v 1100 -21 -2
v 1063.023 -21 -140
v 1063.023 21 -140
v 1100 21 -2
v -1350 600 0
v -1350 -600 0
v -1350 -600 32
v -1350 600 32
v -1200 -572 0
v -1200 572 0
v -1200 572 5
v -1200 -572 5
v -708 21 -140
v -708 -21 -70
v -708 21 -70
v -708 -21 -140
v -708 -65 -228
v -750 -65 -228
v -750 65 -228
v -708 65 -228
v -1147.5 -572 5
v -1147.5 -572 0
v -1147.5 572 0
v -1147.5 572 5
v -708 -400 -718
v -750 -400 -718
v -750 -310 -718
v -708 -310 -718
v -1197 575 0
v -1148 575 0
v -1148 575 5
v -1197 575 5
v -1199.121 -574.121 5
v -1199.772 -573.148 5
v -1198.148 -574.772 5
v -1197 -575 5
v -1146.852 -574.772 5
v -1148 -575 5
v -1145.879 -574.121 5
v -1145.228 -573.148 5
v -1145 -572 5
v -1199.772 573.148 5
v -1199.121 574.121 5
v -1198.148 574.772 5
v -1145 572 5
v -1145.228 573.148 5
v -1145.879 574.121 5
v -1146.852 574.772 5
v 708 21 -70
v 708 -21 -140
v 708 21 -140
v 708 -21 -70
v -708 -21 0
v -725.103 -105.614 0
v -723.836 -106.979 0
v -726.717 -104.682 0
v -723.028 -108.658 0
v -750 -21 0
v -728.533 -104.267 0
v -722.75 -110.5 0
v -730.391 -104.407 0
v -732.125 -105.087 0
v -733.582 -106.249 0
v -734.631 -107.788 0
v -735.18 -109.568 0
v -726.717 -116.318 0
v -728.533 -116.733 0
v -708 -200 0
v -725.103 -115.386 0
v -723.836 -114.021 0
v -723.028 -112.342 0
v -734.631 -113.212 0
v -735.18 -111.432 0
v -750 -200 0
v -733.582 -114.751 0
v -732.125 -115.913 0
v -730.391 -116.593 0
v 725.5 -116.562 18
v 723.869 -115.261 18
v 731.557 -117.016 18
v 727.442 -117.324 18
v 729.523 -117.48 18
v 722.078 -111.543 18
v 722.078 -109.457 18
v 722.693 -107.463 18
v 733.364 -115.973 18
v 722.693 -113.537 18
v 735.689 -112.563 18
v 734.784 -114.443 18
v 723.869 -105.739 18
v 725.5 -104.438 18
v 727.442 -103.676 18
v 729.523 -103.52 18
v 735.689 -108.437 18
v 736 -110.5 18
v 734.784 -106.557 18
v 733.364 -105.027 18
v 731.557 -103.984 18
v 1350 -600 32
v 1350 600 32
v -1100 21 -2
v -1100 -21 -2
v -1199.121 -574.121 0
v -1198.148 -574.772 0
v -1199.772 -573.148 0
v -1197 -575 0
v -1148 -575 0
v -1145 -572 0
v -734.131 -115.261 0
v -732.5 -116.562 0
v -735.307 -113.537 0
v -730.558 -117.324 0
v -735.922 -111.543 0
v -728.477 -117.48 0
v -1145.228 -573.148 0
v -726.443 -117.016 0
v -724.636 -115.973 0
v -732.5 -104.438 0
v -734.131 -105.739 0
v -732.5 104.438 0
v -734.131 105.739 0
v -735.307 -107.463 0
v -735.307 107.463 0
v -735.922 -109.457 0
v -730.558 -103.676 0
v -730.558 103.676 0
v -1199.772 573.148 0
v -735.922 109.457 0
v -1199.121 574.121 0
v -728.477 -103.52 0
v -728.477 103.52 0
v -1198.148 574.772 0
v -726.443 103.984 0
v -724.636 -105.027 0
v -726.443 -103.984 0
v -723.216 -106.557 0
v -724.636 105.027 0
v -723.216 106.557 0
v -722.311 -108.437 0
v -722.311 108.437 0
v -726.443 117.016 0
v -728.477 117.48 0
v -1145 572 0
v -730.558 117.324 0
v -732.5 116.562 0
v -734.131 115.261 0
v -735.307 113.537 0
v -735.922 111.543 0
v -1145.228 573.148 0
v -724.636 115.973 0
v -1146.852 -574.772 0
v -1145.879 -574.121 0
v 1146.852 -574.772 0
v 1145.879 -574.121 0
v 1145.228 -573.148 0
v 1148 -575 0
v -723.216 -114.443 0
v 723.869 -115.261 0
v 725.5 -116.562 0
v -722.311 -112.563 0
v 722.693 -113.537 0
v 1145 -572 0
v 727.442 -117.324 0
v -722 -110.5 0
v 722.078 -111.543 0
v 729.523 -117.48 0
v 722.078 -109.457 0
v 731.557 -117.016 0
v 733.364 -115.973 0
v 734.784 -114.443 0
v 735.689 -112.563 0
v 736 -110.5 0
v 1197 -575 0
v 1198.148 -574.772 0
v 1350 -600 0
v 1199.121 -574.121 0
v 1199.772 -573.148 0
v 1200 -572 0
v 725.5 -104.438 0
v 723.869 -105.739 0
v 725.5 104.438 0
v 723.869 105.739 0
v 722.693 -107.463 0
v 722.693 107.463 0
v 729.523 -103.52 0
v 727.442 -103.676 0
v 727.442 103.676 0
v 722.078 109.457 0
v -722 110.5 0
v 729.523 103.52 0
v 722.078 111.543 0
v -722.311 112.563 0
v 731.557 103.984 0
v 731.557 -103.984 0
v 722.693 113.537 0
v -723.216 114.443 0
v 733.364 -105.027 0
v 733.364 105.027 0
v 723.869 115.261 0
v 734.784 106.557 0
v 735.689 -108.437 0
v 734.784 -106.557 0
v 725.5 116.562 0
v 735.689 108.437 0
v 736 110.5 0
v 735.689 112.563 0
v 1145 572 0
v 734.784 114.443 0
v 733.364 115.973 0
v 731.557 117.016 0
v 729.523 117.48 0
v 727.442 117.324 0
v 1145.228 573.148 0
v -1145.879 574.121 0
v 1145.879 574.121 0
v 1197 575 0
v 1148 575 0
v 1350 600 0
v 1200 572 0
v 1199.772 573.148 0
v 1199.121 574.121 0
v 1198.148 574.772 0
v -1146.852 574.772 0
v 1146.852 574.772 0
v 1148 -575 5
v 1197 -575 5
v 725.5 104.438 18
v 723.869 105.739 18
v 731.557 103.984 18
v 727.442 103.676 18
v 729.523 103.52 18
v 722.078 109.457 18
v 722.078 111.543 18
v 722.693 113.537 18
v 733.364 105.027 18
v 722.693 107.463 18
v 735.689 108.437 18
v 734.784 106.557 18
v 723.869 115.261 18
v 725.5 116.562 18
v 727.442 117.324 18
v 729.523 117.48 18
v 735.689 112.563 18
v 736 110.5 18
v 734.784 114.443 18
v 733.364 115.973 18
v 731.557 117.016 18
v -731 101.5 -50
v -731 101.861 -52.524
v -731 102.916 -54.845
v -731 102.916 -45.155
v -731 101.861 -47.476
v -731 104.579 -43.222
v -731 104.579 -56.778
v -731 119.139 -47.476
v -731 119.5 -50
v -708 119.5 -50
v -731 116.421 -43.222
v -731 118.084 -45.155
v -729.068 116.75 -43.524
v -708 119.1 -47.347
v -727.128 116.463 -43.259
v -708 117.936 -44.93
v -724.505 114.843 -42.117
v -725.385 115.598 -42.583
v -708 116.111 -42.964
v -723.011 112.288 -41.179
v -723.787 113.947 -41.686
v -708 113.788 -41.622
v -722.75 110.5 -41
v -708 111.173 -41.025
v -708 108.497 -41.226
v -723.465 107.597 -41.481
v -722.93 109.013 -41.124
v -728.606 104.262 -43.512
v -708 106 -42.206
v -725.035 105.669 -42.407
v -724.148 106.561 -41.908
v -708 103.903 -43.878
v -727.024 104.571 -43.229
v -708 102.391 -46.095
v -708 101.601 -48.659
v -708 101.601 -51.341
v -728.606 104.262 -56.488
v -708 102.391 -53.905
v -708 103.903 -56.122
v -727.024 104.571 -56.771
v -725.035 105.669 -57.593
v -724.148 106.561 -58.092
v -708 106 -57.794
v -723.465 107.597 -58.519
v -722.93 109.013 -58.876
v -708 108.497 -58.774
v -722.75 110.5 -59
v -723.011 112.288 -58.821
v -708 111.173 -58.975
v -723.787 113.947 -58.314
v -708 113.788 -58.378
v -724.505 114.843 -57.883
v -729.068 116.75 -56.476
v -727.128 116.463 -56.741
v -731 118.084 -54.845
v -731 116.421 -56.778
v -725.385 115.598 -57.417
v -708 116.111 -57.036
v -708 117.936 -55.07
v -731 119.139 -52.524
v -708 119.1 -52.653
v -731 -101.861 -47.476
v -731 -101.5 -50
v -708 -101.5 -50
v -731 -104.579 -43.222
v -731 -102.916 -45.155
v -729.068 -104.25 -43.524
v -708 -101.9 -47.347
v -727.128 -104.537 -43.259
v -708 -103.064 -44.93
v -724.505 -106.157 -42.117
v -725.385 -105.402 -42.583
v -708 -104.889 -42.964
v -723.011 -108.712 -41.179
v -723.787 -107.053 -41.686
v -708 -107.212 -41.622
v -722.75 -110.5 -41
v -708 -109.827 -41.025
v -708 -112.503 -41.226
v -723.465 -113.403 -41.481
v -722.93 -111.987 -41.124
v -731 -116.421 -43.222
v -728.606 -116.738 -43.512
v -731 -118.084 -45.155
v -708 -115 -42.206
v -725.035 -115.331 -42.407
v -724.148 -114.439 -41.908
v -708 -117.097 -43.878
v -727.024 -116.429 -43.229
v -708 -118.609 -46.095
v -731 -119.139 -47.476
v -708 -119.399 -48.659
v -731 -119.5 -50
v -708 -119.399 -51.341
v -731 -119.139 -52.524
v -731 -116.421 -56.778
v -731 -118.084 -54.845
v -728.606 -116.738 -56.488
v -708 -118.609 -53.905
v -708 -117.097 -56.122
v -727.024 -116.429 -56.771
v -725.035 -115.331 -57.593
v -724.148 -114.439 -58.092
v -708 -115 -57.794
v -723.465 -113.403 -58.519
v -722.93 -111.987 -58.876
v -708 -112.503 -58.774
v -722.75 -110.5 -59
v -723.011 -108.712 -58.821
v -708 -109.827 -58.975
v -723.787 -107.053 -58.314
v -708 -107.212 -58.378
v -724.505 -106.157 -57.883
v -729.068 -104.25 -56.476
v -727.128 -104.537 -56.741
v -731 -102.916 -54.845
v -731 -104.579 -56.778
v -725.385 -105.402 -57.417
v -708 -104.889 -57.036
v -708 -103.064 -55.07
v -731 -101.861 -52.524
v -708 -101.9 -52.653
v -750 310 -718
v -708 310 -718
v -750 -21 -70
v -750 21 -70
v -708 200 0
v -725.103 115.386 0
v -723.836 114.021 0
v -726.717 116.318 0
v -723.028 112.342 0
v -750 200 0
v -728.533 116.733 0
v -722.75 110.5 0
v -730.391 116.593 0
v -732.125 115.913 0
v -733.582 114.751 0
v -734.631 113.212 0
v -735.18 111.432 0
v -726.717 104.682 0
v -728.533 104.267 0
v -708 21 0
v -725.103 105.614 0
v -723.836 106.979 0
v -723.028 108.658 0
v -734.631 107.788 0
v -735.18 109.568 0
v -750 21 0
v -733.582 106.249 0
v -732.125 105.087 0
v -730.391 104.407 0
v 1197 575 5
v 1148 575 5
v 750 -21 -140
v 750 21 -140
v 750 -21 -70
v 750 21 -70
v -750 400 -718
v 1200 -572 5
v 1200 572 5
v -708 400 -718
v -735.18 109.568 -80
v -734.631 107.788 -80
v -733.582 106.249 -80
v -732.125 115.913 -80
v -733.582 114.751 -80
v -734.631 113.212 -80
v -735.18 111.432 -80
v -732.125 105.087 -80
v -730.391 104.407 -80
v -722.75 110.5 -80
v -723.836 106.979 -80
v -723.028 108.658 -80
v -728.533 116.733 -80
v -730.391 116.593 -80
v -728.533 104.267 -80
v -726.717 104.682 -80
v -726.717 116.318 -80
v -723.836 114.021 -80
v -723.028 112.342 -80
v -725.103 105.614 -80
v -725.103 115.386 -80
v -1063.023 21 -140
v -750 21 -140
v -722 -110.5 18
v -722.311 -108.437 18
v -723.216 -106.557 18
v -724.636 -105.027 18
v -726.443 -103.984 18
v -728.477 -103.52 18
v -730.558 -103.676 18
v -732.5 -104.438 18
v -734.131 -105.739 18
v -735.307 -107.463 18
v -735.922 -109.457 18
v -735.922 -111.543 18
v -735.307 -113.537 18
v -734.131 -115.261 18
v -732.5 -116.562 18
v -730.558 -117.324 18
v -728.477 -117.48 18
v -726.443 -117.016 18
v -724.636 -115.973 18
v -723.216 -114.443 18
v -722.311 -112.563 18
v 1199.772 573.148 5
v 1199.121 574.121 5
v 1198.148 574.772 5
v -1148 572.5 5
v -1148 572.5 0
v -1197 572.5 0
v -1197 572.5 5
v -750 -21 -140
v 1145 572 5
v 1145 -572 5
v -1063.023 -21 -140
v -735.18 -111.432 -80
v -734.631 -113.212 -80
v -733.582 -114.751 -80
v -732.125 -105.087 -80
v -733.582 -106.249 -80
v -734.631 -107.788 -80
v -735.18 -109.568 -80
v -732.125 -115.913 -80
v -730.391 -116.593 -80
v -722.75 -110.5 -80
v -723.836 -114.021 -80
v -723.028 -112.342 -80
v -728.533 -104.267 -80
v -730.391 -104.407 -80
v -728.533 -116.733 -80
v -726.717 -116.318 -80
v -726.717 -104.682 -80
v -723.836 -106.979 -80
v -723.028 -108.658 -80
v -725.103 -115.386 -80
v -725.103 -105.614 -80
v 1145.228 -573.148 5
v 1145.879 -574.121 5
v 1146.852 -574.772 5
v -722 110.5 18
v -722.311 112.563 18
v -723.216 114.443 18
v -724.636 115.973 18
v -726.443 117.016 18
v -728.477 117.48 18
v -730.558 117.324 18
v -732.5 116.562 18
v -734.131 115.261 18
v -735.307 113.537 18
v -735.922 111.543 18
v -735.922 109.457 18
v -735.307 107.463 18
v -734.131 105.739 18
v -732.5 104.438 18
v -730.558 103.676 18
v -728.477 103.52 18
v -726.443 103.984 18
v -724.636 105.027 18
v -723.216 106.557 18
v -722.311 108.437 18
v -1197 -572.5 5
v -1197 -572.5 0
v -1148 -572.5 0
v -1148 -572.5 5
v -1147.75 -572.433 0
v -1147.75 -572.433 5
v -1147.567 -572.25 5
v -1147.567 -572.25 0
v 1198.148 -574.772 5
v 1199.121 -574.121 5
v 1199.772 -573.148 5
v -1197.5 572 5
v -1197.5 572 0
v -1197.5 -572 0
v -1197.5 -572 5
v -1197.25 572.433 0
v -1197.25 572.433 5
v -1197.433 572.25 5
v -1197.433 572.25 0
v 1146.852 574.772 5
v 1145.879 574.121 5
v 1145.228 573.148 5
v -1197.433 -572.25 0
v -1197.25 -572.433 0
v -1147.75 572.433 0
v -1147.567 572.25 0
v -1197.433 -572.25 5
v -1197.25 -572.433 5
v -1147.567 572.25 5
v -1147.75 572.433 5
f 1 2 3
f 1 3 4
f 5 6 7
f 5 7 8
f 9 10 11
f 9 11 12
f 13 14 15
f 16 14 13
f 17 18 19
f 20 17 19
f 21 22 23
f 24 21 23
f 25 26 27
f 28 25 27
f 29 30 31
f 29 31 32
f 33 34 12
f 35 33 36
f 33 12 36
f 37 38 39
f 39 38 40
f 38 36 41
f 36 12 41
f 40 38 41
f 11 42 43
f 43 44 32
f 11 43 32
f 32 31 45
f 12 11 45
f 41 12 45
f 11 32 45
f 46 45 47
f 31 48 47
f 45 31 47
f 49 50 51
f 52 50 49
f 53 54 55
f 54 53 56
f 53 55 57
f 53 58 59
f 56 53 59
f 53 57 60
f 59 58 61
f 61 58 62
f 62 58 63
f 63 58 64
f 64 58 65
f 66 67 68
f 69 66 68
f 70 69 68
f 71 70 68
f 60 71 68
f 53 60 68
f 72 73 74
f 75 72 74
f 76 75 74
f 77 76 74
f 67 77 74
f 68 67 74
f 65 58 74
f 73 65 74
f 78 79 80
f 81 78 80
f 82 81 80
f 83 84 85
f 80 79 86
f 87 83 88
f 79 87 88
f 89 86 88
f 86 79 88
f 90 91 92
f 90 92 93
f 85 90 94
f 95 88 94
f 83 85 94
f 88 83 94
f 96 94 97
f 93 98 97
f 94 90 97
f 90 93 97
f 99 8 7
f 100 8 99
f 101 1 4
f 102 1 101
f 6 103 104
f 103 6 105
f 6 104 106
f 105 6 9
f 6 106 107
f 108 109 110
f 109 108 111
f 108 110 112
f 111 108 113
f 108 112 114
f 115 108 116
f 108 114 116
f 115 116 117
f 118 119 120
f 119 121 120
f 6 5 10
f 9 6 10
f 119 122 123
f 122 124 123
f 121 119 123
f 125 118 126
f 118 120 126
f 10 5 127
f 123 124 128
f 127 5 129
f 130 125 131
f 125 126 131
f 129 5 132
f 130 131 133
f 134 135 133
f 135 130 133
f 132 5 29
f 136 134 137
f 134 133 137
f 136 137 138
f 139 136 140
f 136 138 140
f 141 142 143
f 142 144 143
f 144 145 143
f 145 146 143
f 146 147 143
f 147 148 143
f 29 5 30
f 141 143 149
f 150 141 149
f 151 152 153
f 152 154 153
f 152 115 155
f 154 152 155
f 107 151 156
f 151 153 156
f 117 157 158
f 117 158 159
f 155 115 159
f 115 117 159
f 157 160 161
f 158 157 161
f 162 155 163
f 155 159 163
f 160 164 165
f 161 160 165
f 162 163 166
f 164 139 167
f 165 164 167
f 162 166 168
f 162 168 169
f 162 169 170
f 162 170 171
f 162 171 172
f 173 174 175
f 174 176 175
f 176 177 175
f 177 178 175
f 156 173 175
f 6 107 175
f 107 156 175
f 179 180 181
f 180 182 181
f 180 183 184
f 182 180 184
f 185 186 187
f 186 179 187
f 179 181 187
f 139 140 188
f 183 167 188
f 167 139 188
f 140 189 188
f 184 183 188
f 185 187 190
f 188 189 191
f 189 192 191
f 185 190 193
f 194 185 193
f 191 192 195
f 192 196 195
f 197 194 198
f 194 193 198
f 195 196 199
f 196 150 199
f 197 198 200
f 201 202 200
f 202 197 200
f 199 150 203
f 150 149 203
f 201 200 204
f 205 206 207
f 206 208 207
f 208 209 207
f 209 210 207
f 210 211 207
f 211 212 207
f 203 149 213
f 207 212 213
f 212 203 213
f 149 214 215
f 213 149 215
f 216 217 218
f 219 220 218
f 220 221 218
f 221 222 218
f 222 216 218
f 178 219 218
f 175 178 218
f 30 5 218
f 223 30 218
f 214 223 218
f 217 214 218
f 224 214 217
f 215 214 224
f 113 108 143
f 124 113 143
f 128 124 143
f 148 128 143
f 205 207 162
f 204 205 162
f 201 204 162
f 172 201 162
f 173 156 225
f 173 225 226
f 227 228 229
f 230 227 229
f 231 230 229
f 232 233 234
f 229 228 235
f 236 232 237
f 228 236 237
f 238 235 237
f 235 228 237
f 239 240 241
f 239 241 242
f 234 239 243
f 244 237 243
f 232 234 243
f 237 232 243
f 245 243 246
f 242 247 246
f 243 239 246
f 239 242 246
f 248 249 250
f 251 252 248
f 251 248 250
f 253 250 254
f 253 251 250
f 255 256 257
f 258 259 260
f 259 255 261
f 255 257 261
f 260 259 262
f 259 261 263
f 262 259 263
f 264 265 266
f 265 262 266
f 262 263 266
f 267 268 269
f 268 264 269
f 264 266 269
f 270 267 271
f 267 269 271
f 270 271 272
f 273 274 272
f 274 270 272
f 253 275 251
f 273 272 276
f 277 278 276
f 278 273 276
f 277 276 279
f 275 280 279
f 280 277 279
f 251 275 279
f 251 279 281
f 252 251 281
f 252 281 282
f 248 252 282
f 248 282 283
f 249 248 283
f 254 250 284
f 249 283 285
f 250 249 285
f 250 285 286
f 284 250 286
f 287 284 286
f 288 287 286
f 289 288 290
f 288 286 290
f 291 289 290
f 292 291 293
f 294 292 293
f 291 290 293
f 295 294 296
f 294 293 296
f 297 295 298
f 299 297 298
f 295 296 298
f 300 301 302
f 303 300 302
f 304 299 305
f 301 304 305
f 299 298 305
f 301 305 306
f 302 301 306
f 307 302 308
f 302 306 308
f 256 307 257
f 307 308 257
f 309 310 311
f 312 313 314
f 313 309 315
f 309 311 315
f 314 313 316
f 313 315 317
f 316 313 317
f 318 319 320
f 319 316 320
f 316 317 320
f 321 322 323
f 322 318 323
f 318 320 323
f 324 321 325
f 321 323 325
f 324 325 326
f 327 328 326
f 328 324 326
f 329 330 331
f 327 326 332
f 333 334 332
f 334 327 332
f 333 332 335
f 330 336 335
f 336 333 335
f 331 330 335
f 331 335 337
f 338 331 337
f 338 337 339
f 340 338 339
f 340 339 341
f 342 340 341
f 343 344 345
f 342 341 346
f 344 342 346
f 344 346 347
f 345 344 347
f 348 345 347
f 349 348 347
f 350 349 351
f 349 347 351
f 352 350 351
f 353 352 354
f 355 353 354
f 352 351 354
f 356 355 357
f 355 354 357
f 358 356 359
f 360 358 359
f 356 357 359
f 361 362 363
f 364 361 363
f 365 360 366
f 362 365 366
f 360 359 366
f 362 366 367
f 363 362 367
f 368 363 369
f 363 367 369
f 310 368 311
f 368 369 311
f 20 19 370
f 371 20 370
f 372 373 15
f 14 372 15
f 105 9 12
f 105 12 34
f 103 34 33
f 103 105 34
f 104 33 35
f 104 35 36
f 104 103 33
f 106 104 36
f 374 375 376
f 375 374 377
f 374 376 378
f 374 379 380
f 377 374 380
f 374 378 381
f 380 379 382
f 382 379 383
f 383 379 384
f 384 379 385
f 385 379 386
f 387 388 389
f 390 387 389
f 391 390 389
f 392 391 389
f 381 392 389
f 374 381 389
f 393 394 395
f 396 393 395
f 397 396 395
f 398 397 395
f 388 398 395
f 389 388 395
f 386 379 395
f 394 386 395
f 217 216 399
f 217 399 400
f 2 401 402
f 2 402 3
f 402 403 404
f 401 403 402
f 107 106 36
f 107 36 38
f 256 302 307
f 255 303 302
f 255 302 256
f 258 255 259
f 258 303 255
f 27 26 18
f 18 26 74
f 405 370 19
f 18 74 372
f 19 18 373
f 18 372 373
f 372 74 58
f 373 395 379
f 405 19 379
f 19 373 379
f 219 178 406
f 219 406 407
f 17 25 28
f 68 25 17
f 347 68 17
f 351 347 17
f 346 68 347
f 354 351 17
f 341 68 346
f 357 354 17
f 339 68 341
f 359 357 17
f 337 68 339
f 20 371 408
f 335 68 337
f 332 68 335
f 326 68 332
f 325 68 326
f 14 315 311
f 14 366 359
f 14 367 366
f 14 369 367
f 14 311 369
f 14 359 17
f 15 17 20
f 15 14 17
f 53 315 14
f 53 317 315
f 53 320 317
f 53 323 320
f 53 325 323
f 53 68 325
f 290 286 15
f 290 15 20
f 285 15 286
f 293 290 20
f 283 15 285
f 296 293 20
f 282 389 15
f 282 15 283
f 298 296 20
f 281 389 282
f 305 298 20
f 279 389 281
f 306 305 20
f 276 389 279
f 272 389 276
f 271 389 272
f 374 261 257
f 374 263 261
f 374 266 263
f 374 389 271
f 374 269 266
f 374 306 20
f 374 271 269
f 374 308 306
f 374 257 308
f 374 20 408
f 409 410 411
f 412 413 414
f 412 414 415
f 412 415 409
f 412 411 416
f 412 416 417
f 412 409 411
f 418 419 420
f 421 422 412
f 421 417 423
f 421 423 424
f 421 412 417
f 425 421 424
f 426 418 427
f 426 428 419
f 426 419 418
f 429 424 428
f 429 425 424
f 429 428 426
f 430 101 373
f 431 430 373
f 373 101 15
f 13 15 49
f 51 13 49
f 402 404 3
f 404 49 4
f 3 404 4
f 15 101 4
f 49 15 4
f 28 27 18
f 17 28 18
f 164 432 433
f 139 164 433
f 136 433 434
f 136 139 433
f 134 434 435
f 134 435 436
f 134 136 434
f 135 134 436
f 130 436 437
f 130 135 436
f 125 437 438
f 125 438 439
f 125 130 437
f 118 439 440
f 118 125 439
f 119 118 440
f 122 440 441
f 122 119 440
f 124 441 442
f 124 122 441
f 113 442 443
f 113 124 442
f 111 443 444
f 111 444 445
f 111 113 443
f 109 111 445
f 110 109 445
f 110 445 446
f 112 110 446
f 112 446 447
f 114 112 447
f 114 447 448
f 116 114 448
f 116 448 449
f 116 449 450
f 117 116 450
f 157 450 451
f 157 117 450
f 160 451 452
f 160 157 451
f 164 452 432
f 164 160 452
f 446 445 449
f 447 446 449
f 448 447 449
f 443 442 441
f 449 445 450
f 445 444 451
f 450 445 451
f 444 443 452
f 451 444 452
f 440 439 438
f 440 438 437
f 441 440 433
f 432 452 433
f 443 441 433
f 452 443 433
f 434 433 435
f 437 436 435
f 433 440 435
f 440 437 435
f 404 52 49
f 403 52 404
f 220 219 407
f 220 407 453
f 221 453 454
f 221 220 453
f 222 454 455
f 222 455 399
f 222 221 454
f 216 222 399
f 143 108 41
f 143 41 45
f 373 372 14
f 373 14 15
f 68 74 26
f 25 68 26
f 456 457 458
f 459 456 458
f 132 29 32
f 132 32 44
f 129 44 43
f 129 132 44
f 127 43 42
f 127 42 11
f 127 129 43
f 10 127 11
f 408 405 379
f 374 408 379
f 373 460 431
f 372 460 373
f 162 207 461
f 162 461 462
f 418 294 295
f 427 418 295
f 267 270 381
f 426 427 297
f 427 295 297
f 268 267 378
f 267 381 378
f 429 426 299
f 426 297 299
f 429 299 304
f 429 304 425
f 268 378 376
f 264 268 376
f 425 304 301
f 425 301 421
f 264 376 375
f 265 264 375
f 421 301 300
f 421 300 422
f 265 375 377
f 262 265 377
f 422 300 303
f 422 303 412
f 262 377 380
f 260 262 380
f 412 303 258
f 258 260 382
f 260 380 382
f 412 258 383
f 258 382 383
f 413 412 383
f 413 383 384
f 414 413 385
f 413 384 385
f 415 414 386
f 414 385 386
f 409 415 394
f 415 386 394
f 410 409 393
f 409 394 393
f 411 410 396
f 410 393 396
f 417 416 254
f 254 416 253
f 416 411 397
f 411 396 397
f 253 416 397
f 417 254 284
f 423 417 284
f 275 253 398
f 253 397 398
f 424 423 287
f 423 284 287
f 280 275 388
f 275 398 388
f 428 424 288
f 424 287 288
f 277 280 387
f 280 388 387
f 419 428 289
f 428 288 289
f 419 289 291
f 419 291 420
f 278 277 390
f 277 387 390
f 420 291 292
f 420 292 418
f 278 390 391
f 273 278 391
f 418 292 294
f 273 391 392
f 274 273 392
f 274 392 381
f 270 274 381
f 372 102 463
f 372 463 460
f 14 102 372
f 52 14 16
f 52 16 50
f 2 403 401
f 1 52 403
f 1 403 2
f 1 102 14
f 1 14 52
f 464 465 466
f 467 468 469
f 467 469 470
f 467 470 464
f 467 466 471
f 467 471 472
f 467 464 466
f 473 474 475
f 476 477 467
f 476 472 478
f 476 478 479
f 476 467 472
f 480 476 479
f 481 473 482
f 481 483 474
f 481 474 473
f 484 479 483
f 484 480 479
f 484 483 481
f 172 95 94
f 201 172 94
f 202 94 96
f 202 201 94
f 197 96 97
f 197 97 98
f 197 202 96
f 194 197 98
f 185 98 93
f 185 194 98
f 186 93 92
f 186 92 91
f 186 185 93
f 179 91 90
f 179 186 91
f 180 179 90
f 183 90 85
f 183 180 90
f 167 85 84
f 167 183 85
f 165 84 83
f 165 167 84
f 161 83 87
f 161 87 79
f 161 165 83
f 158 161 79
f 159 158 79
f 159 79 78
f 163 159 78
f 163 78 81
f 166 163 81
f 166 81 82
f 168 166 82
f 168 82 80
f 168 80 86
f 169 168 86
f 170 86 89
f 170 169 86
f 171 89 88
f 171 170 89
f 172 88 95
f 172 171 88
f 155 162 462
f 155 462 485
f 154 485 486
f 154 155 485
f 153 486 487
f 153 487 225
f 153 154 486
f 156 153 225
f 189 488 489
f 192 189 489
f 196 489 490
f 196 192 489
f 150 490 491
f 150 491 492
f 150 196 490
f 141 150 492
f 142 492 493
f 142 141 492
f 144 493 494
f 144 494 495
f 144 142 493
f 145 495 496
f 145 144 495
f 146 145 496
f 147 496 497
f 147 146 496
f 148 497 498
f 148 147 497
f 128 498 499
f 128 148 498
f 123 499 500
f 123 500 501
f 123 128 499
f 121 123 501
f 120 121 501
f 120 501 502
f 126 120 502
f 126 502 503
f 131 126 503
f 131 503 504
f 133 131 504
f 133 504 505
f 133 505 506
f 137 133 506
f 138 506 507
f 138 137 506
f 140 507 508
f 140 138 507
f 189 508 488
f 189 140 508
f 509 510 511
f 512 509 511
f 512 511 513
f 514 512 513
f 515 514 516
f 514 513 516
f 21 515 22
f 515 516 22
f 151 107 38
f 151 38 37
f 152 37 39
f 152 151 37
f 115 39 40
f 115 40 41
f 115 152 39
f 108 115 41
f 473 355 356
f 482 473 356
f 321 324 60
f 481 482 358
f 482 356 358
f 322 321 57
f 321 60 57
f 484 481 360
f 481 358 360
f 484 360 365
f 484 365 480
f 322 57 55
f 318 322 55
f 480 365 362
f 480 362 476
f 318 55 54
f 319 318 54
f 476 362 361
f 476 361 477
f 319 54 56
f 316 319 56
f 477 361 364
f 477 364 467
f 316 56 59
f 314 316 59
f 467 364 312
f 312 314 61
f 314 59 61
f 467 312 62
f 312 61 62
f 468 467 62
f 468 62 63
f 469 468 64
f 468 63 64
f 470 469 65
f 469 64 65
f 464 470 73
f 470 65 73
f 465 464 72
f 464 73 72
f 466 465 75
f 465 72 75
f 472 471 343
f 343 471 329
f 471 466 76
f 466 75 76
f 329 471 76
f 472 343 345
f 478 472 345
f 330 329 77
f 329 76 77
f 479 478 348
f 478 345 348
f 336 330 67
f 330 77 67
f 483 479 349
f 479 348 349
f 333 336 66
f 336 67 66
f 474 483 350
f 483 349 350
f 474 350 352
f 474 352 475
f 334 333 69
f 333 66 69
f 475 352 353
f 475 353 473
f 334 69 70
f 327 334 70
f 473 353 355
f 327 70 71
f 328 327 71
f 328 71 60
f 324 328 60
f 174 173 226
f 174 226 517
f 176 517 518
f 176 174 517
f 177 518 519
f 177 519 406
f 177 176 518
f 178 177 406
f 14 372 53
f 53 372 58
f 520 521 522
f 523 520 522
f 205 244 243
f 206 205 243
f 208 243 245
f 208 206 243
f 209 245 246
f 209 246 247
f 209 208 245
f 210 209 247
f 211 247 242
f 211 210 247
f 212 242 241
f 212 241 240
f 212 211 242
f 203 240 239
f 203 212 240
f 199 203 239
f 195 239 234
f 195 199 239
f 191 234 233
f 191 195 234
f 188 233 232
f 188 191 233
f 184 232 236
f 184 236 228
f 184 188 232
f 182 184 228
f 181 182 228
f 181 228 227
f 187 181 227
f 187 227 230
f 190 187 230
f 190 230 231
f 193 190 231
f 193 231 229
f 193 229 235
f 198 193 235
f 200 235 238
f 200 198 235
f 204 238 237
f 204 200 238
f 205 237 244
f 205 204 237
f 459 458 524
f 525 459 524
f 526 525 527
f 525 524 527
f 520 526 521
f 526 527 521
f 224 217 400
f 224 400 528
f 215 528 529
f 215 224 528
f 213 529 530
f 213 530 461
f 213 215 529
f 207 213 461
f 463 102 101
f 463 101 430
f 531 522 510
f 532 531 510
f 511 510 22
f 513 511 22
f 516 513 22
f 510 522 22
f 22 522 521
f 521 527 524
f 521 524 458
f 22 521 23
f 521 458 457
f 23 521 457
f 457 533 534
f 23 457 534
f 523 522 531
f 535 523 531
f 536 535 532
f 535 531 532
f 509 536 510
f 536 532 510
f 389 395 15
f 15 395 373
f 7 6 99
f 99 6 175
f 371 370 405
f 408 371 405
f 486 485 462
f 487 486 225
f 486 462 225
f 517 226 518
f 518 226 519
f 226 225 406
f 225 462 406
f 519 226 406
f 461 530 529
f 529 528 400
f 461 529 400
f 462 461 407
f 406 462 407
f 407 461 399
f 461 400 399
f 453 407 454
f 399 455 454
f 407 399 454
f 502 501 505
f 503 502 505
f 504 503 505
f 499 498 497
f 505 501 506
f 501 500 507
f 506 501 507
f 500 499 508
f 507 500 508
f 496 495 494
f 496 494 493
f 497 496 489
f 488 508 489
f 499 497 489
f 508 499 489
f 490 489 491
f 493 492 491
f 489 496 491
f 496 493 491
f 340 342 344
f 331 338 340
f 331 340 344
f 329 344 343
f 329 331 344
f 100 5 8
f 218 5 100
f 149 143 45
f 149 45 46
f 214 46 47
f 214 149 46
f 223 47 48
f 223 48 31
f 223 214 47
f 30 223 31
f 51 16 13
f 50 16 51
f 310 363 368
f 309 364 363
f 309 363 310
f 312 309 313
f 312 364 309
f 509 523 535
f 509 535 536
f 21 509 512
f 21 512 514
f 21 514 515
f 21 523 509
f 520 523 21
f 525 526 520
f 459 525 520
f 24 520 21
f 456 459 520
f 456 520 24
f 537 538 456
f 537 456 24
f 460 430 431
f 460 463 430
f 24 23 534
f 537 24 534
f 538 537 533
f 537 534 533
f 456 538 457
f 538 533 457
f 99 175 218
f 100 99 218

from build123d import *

# Parameters (mm, degrees)
F0_W      = 2700
F0_H      = 1200
F1_DEPTH  = 32
F2_DEPTH  = 5
F3_DEPTH  = 5
F5_W      = 42
F5_H      = 70
F6_DEPTH  = 42
F7_R      = 7
F7_R_2    = 6.25
F8_DEPTH  = 18
F9_DEPTH  = 80
F10_R     = 9
F11_DEPTH = 23
F13_DEPTH = 21


with BuildPart() as f1:
    # F0 (on Top) → F1 (new body)
    with BuildSketch(Plane.XY):
        Rectangle(F0_W, F0_H)
        with BuildLine():
            Line((-1197, 575), (-1148, 575))
            ThreePointArc((-1148, 575), (-1145.8786796564, 574.1213203436), (-1145, 572))
            Line((-1145, 572), (-1145, -572))
            ThreePointArc((-1145, -572), (-1145.8786796564, -574.1213203436), (-1148, -575))
            Line((-1148, -575), (-1197, -575))
            ThreePointArc((-1197, -575), (-1199.1213203436, -574.1213203436), (-1200, -572))
            Line((-1200, -572), (-1200, 572))
            ThreePointArc((-1200, 572), (-1199.1213203436, 574.1213203436), (-1197, 575))
        make_face(mode=Mode.SUBTRACT)
        with BuildLine():
            Line((1197, -575), (1148, -575))
            ThreePointArc((1148, -575), (1145.8786796564, -574.1213203436), (1145, -572))
            Line((1145, -572), (1145, 572))
            ThreePointArc((1145, 572), (1145.8786796564, 574.1213203436), (1148, 575))
            Line((1148, 575), (1197, 575))
            ThreePointArc((1197, 575), (1199.1213203436, 574.1213203436), (1200, 572))
            Line((1200, 572), (1200, -572))
            ThreePointArc((1200, -572), (1199.1213203436, -574.1213203436), (1197, -575))
        make_face(mode=Mode.SUBTRACT)
        with BuildLine():
            ThreePointArc((-1145, 572), (-1145.8786796564, 574.1213203436), (-1148, 575))
            Line((-1148, 575), (-1197, 575))
            ThreePointArc((-1197, 575), (-1199.1213203436, 574.1213203436), (-1200, 572))
            Line((-1200, 572), (-1200, -572))
            ThreePointArc((-1200, -572), (-1199.1213203436, -574.1213203436), (-1197, -575))
            Line((-1197, -575), (-1148, -575))
            ThreePointArc((-1148, -575), (-1145.8786796564, -574.1213203436), (-1145, -572))
            Line((-1145, -572), (-1145, 572))
        make_face()
        with BuildLine():
            ThreePointArc((-1148, 572.5), (-1147.6464466094, 572.3535533906), (-1147.5, 572))
            Line((-1147.5, 572), (-1147.5, -572))
            ThreePointArc((-1147.5, -572), (-1147.6464466094, -572.3535533906), (-1148, -572.5))
            Line((-1148, -572.5), (-1197, -572.5))
            ThreePointArc((-1197, -572.5), (-1197.3535533906, -572.3535533906), (-1197.5, -572))
            Line((-1197.5, -572), (-1197.5, 572))
            ThreePointArc((-1197.5, 572), (-1197.3535533906, 572.3535533906), (-1197, 572.5))
            Line((-1197, 572.5), (-1148, 572.5))
        make_face(mode=Mode.SUBTRACT)
        with BuildLine():
            ThreePointArc((1145, -572), (1145.8786796564, -574.1213203436), (1148, -575))
            Line((1148, -575), (1197, -575))
            ThreePointArc((1197, -575), (1199.1213203436, -574.1213203436), (1200, -572))
            Line((1200, -572), (1200, 572))
            ThreePointArc((1200, 572), (1199.1213203436, 574.1213203436), (1197, 575))
            Line((1197, 575), (1148, 575))
            ThreePointArc((1148, 575), (1145.8786796564, 574.1213203436), (1145, 572))
            Line((1145, 572), (1145, -572))
        make_face()
        with BuildLine():
            Line((-1147.5, -572), (-1147.5, 572))
            ThreePointArc((-1147.5, 572), (-1147.6464466094, 572.3535533906), (-1148, 572.5))
            Line((-1148, 572.5), (-1197, 572.5))
            ThreePointArc((-1197, 572.5), (-1197.3535533906, 572.3535533906), (-1197.5, 572))
            Line((-1197.5, 572), (-1197.5, -572))
            ThreePointArc((-1197.5, -572), (-1197.3535533906, -572.3535533906), (-1197, -572.5))
            Line((-1197, -572.5), (-1148, -572.5))
            ThreePointArc((-1148, -572.5), (-1147.6464466094, -572.3535533906), (-1147.5, -572))
        make_face()
    extrude(amount=F1_DEPTH)

    # F0 (on Top) → F2 (cut)
    with BuildSketch(Plane.XY):
        with BuildLine():
            ThreePointArc((-1145, 572), (-1145.8786796564, 574.1213203436), (-1148, 575))
            Line((-1148, 575), (-1197, 575))
            ThreePointArc((-1197, 575), (-1199.1213203436, 574.1213203436), (-1200, 572))
            Line((-1200, 572), (-1200, -572))
            ThreePointArc((-1200, -572), (-1199.1213203436, -574.1213203436), (-1197, -575))
            Line((-1197, -575), (-1148, -575))
            ThreePointArc((-1148, -575), (-1145.8786796564, -574.1213203436), (-1145, -572))
            Line((-1145, -572), (-1145, 572))
        make_face()
        with BuildLine():
            ThreePointArc((-1148, 572.5), (-1147.6464466094, 572.3535533906), (-1147.5, 572))
            Line((-1147.5, 572), (-1147.5, -572))
            ThreePointArc((-1147.5, -572), (-1147.6464466094, -572.3535533906), (-1148, -572.5))
            Line((-1148, -572.5), (-1197, -572.5))
            ThreePointArc((-1197, -572.5), (-1197.3535533906, -572.3535533906), (-1197.5, -572))
            Line((-1197.5, -572), (-1197.5, 572))
            ThreePointArc((-1197.5, 572), (-1197.3535533906, 572.3535533906), (-1197, 572.5))
            Line((-1197, 572.5), (-1148, 572.5))
        make_face(mode=Mode.SUBTRACT)
        with BuildLine():
            ThreePointArc((1145, -572), (1145.8786796564, -574.1213203436), (1148, -575))
            Line((1148, -575), (1197, -575))
            ThreePointArc((1197, -575), (1199.1213203436, -574.1213203436), (1200, -572))
            Line((1200, -572), (1200, 572))
            ThreePointArc((1200, 572), (1199.1213203436, 574.1213203436), (1197, 575))
            Line((1197, 575), (1148, 575))
            ThreePointArc((1148, 575), (1145.8786796564, 574.1213203436), (1145, 572))
            Line((1145, 572), (1145, -572))
        make_face()
        with BuildLine():
            Line((-1147.5, -572), (-1147.5, 572))
            ThreePointArc((-1147.5, 572), (-1147.6464466094, 572.3535533906), (-1148, 572.5))
            Line((-1148, 572.5), (-1197, 572.5))
            ThreePointArc((-1197, 572.5), (-1197.3535533906, 572.3535533906), (-1197.5, 572))
            Line((-1197.5, 572), (-1197.5, -572))
            ThreePointArc((-1197.5, -572), (-1197.3535533906, -572.3535533906), (-1197, -572.5))
            Line((-1197, -572.5), (-1148, -572.5))
            ThreePointArc((-1148, -572.5), (-1147.6464466094, -572.3535533906), (-1147.5, -572))
        make_face()
    extrude(amount=F2_DEPTH, mode=Mode.SUBTRACT)

    # F7 (on face) → F8 (cut)
    with BuildSketch(Plane.XY):
        with Locations((-729, 110.5)):
            Circle(F7_R)
        with Locations((-729, 110.5)):
            Circle(F7_R_2, mode=Mode.SUBTRACT)
        with Locations((-729, 110.5)):
            Circle(F7_R_2)
        with Locations((-729, -110.5)):
            Circle(F7_R)
        with Locations((-729, -110.5)):
            Circle(F7_R_2, mode=Mode.SUBTRACT)
        with Locations((-729, -110.5)):
            Circle(F7_R_2)
        with Locations((729, -110.5)):
            Circle(F7_R)
        with Locations((729, 110.5)):
            Circle(F7_R)
    extrude(amount=F8_DEPTH, mode=Mode.SUBTRACT)


with BuildPart() as f3:
    # F0 (on Top) → F3 (new body)
    with BuildSketch(Plane.XY):
        with BuildLine():
            Line((-1147.5, -572), (-1147.5, 572))
            ThreePointArc((-1147.5, 572), (-1147.6464466094, 572.3535533906), (-1148, 572.5))
            Line((-1148, 572.5), (-1197, 572.5))
            ThreePointArc((-1197, 572.5), (-1197.3535533906, 572.3535533906), (-1197.5, 572))
            Line((-1197.5, 572), (-1197.5, -572))
            ThreePointArc((-1197.5, -572), (-1197.3535533906, -572.3535533906), (-1197, -572.5))
            Line((-1197, -572.5), (-1148, -572.5))
            ThreePointArc((-1148, -572.5), (-1147.6464466094, -572.3535533906), (-1147.5, -572))
        make_face()
    extrude(amount=F3_DEPTH)


with BuildPart() as f6:
    # F5 (on offset) → F6 (new body)
    with BuildSketch(Plane.YZ.offset(-750)):
        Polygon((-21, -70), (-21, 0), (-200, 0), (-400, -718), (-310, -718), (-65, -228), (0, -228), (65, -228), (310, -718), (400, -718), (200, 0), (21, 0), (21, -70), (21, -140), (-21, -140), align=None)
        with Locations((0, -105)):
            Rectangle(F5_W, F5_H)
    extrude(amount=F6_DEPTH)

    # F7 (on face) → F9 (cut)
    with BuildSketch(Plane.XY):
        with Locations((-729, 110.5)):
            Circle(F7_R_2)
        with Locations((-729, -110.5)):
            Circle(F7_R_2)
    extrude(amount=-F9_DEPTH, mode=Mode.SUBTRACT)

    # F10 (on face) → F11 (cut)
    with BuildSketch(Plane.YZ.offset(-708)):
        with Locations((110.5, -50)):
            Circle(F10_R)
        with Locations((-110.5, -50)):
            Circle(F10_R)
    extrude(amount=-F11_DEPTH, mode=Mode.SUBTRACT)


with BuildPart() as f13:
    # F12 (on Front) → F13 (new body, symmetric)
    with BuildSketch(Plane.XZ):
        Polygon((-750, -70), (-708, -70), (-708, -140), (0, -140), (708, -140), (708, -70), (750, -70), (750, -140), (1063.0230114445, -140), (1100, -2), (0.3708260011, -2), (-0.3708260011, -2), (-1100, -2), (-1063.0230114445, -140), (-750, -140), align=None)
    extrude(amount=F13_DEPTH, both=True)


solid = Compound([f1.part, f3.part, f6.part, f13.part])
